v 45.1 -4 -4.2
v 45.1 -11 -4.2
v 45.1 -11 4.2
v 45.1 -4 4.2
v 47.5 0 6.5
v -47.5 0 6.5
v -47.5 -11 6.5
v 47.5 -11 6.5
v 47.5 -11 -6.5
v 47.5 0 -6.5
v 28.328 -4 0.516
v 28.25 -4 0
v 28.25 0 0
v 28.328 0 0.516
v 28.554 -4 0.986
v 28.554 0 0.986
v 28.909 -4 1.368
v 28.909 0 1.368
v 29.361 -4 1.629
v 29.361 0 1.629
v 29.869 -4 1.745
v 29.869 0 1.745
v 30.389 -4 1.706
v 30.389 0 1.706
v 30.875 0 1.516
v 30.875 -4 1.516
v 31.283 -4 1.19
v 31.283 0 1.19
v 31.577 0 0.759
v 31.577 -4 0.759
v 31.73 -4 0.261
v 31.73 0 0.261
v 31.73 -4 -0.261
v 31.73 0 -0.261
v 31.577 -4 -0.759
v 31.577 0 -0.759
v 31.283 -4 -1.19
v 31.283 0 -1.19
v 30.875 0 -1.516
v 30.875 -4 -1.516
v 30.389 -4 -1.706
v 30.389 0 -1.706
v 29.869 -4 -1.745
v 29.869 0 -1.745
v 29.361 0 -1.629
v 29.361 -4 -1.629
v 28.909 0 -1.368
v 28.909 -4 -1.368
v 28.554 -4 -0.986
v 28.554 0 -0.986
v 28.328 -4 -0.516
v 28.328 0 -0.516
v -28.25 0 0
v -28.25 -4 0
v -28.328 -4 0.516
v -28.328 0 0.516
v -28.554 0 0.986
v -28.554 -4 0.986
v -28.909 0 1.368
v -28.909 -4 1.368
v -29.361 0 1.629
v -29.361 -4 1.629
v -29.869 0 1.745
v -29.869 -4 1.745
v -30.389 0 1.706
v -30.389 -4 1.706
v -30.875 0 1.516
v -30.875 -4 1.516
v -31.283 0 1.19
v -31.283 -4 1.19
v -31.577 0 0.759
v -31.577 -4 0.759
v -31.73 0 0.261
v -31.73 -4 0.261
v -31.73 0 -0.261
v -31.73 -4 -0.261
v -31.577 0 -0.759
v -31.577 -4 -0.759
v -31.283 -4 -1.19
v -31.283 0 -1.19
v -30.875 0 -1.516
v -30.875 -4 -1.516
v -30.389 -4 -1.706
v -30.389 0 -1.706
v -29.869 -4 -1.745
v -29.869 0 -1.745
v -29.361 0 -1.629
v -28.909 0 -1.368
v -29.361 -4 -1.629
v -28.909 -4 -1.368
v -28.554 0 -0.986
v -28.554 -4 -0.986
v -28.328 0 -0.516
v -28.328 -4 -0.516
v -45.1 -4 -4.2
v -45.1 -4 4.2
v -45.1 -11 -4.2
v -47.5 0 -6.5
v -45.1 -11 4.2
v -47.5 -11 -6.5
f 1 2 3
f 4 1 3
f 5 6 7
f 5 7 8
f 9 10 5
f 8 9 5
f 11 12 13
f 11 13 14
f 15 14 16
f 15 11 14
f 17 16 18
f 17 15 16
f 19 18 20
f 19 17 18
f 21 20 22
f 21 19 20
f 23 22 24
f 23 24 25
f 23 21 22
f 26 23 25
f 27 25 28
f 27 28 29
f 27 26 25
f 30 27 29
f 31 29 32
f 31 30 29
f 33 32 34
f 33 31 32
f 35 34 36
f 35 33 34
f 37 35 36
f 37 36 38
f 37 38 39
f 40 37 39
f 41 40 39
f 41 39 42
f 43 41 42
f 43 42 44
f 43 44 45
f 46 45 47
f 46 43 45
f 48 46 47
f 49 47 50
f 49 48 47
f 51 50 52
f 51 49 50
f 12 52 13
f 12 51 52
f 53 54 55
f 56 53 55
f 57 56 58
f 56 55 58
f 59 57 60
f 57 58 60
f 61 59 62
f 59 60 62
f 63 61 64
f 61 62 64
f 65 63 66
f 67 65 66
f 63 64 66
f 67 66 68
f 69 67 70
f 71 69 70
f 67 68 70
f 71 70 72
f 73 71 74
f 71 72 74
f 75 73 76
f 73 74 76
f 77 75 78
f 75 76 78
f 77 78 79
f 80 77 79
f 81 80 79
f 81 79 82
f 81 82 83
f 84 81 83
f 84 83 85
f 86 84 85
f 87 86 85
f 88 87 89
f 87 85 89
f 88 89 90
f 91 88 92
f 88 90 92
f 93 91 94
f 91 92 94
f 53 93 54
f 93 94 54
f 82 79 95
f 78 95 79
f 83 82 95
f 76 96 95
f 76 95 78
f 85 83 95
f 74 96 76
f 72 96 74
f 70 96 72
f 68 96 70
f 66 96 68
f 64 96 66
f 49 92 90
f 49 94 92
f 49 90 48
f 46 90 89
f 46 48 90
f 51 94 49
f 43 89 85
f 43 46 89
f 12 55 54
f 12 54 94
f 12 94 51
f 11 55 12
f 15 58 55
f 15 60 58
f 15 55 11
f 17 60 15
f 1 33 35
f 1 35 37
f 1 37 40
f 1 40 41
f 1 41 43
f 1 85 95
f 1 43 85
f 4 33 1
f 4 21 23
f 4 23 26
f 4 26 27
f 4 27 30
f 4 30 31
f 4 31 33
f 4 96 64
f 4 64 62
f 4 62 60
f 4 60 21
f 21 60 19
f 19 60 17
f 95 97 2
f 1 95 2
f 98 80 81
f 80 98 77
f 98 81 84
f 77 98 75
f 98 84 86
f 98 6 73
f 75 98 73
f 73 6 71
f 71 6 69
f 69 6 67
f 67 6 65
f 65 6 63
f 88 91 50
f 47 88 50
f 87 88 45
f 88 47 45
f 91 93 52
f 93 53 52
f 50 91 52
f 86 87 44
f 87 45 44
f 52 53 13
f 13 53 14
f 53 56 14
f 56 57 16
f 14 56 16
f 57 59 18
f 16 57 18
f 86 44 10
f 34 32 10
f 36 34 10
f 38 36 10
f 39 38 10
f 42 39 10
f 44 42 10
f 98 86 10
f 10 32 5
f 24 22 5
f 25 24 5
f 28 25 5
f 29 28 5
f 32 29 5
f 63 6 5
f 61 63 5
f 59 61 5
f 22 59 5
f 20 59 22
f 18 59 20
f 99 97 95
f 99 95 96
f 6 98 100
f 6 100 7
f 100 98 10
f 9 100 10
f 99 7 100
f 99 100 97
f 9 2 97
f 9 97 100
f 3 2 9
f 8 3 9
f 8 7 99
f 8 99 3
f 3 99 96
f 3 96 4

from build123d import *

# Parameters (mm, degrees)
F0_W     = 95
F0_H     = 13
F1_DEPTH = 11
F2_W     = 90.2
F2_H     = 8.4
F3_DEPTH = 7
F4_R     = 1.75
F5_DEPTH = 4


# Not quite as in the source:
# - a pattern or mirror of a feature is missing from the dataset's text; its kind, count and spacing are read off the source's solid


with BuildPart() as f1:
    # F0 (on Front) → F1 (new body)
    with BuildSketch(Plane.XZ):
        Rectangle(F0_W, F0_H)
    extrude(amount=F1_DEPTH)

    # F2 (on face) → F3 (cut)
    with BuildSketch(Plane.XZ.offset(11)):
        Rectangle(F2_W, F2_H)
    extrude(amount=-F3_DEPTH, mode=Mode.SUBTRACT)

    # F4 (on face) → F5 (cut, through all)
    with BuildSketch(Plane.XZ.offset(4)):
        with Locations((-30, 0)):
            Circle(F4_R)
    f5 = extrude(amount=-F5_DEPTH, mode=Mode.SUBTRACT)

    # F5_copies: F5 across plane
    add(f5.mirror(Plane(origin=(0, 0, 0), x_dir=(0, 0, 1), z_dir=(1, 0, 0))), mode=Mode.SUBTRACT)


solid = f1.part
